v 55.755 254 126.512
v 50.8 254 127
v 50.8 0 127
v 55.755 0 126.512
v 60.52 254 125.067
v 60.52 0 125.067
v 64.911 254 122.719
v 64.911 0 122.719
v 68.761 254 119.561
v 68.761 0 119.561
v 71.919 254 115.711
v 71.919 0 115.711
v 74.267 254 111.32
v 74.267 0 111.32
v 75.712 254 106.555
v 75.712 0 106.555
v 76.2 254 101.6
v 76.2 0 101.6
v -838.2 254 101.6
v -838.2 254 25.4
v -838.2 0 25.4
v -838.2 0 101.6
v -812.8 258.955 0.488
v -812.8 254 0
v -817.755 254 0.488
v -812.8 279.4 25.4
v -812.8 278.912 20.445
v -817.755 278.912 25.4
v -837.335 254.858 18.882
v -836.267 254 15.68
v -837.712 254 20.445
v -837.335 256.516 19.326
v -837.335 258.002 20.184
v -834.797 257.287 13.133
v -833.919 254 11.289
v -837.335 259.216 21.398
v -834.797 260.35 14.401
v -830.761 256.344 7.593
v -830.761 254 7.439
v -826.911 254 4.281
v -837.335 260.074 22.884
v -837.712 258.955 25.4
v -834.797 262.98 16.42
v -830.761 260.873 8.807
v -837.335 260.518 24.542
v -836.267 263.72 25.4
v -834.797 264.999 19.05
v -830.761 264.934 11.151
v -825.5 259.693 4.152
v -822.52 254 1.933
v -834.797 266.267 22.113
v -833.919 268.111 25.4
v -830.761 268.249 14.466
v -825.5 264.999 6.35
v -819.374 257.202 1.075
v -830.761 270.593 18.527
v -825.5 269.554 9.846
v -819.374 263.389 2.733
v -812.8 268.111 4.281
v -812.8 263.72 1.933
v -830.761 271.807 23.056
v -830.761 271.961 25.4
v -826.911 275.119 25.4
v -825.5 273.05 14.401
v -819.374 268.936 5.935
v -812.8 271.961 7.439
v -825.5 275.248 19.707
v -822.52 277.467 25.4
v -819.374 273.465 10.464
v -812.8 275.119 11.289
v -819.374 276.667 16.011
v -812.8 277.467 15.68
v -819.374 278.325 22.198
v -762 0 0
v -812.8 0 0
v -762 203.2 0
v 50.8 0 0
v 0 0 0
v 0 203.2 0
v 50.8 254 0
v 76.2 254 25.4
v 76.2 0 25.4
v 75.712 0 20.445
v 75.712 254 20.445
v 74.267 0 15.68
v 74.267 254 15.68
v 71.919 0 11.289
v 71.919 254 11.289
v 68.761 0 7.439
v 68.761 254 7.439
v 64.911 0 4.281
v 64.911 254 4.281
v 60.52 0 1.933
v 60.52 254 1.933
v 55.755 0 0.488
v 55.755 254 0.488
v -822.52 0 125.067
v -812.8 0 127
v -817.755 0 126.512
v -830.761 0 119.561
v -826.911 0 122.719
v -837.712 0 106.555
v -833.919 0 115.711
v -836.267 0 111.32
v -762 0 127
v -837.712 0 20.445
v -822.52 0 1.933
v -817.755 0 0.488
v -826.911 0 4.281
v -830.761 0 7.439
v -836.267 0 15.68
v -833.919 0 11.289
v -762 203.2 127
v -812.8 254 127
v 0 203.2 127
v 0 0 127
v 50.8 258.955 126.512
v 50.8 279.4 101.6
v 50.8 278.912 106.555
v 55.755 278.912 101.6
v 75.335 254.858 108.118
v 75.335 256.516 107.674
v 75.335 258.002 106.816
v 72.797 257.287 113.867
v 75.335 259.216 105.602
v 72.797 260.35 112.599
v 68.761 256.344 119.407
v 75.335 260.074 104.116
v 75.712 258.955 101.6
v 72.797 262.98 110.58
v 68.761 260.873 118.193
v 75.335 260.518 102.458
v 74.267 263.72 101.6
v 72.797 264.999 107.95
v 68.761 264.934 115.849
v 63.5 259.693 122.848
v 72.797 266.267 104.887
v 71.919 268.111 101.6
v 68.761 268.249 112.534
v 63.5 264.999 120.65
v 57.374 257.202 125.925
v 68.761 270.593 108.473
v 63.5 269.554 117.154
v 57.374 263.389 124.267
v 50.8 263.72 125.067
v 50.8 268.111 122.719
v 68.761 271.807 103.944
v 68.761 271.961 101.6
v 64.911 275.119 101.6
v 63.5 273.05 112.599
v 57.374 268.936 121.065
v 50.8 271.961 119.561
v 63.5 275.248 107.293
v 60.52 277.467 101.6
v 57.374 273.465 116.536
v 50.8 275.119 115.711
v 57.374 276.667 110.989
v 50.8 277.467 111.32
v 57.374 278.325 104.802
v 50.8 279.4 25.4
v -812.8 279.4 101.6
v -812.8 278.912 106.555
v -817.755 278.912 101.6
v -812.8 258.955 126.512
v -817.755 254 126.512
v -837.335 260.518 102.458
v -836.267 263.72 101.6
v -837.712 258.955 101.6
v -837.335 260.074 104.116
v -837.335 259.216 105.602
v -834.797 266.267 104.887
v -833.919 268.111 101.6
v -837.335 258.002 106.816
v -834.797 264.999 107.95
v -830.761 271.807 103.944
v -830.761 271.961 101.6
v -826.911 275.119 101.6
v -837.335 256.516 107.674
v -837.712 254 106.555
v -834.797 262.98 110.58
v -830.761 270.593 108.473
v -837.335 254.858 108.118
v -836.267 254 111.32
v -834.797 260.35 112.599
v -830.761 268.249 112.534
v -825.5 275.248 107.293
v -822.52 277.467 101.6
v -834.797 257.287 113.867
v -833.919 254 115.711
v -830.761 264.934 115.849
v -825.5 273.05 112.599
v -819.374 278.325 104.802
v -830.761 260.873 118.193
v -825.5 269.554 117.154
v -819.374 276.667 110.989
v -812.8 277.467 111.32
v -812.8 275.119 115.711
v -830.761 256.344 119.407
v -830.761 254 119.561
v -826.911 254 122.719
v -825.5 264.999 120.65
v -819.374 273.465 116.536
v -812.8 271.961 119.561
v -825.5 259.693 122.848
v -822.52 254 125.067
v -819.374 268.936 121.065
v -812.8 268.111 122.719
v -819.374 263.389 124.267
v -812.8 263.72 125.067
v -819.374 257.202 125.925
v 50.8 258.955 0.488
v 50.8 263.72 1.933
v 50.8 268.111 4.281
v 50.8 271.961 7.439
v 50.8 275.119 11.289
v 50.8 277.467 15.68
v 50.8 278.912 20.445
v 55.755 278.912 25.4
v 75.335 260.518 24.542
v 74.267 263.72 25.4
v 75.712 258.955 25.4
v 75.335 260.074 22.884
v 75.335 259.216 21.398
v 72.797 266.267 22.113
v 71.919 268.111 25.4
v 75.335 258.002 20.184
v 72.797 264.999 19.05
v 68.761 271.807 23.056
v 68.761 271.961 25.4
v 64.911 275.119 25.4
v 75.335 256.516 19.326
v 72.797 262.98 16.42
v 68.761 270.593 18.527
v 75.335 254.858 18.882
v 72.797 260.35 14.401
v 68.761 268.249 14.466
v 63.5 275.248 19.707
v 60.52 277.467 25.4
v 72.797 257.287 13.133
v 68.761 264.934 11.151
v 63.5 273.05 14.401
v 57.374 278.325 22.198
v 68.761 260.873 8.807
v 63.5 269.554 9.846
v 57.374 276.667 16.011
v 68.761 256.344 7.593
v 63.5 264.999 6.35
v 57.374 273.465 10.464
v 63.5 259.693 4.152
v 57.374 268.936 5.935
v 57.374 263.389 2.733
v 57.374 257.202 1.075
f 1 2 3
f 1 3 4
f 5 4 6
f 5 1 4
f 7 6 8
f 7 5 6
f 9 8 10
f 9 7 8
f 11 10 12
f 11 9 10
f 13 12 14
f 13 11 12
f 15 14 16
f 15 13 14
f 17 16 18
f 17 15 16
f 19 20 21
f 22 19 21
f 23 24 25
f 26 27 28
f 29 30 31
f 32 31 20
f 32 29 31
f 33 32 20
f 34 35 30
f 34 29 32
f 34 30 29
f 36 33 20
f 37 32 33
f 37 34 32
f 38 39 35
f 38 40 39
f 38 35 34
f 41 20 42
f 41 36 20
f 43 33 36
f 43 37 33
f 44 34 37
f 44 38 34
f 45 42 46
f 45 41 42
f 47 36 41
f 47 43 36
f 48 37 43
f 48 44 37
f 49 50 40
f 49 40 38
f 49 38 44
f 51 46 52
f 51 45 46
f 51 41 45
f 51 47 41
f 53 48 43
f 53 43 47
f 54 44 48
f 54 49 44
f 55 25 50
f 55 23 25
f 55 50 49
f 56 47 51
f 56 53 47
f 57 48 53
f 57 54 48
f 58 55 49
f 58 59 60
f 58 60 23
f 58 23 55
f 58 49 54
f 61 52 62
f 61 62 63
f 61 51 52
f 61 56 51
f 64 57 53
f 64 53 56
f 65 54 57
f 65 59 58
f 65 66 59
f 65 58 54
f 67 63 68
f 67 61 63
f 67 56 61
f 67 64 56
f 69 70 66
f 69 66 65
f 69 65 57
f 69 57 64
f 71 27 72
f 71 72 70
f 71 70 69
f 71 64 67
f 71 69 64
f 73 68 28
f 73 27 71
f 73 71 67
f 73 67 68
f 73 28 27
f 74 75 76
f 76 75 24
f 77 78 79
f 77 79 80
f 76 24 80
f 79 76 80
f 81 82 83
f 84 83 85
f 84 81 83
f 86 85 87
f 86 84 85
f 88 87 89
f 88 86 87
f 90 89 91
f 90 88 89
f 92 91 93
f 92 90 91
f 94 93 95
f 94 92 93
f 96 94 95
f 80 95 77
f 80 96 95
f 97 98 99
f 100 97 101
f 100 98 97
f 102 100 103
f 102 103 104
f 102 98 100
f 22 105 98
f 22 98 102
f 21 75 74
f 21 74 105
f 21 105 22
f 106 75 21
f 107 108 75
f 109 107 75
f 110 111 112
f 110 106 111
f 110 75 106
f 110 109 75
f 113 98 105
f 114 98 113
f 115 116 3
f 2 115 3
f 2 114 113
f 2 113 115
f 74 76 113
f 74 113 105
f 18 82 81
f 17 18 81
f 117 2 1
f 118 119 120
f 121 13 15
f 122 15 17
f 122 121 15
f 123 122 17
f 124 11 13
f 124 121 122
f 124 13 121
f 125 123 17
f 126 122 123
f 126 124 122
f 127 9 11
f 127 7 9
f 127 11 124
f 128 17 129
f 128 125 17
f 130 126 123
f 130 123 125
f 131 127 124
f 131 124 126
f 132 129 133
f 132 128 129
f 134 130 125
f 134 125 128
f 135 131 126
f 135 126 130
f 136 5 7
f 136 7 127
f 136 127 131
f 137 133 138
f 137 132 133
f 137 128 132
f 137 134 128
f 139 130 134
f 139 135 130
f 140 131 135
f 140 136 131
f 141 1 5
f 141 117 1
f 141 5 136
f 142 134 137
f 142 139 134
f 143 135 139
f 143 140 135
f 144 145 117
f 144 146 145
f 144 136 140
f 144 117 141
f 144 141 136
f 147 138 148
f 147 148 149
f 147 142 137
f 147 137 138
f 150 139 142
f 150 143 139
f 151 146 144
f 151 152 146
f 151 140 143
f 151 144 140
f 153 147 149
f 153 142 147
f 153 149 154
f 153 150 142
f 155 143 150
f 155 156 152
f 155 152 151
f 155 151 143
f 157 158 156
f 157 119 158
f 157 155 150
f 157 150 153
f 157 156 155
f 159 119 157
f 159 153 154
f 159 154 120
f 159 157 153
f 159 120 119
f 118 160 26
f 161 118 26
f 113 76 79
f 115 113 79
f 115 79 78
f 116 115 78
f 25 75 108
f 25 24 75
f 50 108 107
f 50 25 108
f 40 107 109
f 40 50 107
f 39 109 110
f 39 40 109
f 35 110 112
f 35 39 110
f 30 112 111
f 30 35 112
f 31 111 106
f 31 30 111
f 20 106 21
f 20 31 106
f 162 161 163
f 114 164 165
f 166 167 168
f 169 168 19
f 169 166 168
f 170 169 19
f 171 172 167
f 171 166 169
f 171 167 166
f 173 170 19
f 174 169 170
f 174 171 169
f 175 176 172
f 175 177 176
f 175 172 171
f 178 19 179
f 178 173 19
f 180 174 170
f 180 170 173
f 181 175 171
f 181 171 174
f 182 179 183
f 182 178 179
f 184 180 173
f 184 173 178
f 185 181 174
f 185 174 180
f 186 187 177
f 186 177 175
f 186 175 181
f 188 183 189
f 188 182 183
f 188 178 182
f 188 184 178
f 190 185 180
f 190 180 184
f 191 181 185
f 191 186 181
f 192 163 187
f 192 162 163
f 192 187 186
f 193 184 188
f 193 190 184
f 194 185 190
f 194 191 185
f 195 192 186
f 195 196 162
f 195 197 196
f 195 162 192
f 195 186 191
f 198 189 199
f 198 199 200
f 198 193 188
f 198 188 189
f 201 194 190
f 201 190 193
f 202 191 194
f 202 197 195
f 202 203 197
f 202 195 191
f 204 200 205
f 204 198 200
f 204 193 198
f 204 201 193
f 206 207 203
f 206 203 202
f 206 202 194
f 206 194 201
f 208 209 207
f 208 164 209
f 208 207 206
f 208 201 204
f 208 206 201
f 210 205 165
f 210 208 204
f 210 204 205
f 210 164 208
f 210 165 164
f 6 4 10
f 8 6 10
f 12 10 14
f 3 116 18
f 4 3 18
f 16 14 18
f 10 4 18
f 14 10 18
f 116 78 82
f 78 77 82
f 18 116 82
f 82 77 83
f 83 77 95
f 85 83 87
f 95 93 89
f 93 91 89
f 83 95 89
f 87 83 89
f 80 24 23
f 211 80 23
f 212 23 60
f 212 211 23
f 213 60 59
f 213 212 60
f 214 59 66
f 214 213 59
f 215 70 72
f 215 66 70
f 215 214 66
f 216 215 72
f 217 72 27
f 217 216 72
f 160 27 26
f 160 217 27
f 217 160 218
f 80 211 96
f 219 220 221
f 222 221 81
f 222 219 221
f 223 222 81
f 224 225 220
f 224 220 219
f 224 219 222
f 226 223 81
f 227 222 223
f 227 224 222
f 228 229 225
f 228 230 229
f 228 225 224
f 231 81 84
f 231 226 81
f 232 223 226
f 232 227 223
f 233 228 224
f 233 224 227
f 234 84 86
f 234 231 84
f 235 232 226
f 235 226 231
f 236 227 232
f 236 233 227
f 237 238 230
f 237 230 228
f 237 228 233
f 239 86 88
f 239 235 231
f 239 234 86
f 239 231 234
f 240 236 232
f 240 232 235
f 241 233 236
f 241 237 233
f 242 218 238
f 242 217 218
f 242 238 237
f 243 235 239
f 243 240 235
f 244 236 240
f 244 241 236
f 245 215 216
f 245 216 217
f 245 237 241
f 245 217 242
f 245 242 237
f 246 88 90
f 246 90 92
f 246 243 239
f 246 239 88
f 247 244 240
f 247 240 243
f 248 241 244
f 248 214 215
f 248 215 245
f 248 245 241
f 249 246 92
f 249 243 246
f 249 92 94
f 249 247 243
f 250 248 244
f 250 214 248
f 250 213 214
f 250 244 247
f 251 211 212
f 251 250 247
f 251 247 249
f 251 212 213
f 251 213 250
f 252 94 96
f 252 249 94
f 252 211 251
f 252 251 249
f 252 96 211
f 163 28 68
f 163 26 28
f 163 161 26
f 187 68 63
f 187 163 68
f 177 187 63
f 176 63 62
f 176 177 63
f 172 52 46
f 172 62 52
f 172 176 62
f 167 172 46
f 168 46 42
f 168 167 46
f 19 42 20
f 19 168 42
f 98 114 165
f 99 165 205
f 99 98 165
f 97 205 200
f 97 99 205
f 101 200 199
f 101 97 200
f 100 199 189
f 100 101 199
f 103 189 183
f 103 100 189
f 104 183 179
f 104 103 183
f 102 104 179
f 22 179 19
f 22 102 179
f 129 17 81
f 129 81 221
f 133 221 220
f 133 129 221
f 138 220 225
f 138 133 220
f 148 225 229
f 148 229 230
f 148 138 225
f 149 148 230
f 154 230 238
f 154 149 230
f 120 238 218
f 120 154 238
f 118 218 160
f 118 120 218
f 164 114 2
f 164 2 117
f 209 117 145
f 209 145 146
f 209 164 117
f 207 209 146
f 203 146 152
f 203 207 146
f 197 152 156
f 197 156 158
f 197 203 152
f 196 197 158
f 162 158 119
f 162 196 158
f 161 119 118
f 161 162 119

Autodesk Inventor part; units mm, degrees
ref_plane "YZ Plane" through (0, 0, 0) normal (1, 0, 0) x (0, 1, 0)
ref_plane "XZ Plane" through (0, 0, 0) normal (0, 1, 0) x (-1, 0, 0)
ref_plane "XY Plane" through (0, 0, 0) normal (0, 0, 1) x (1, 0, 0)
sketch "Sketch1" plane through (0, 0, 0) normal (0, 0, 1) x (1, 0, 0)
  line L0 (0, 0) -> (76.2, 0)
  line L1 (76.2, 0) -> (76.2, 279.4)
  line L2 (76.2, 279.4) -> (0, 279.4)
  line L3 (0, 279.4) -> (0, 0)
  line L4 (0, 279.4) -> (-838.2, 279.4)
  line L5 (-838.2, 279.4) -> (-838.2, 203.2)
  line L6 (-838.2, 203.2) -> (0, 203.2)
  line L7 (0, 203.2) -> (0, 279.4)
  line L8 (-838.2, 203.2) -> (-762, 203.2)
  line L9 (-762, 203.2) -> (-762, 0)
  line L10 (-762, 0) -> (-838.2, 0)
  line L11 (-838.2, 0) -> (-838.2, 203.2)
  dimension "d0" = 76.2
  dimension "d1" = 279.4
  dimension "d2" = 838.2
  dimension "d3" = 76.2
  dimension "d4" = 76.2
  dimension "d5" = 203.2
extrude "Extrusion1" add sketch "Sketch1" along normal blind 127
sketch "Sketch2" plane through (-838.2, 279.4, 0) normal (0, 1, 0) x (1, 0, 0)
  line L0 (642.6606, -111.4085) -> (325.9156, -111.4085) construction
  line L1 (325.9156, -111.4085) -> (325.9156, -9.0111) construction
  line L2 (325.9156, -9.0111) -> (642.6606, -9.0111) construction
  line L3 (642.6606, -9.0111) -> (642.6606, -111.4085) construction
  point P0 (838.2, 0)
fillet "Fillet1" radius 25.4 8 edges at (-381, 279.4, 127) (-381, 279.4, 0) (76.2, 139.7, 127) (76.2, 139.7, 0) (76.2, 279.4, 63.5) (-838.2, 279.4, 63.5) (-838.2, 139.7, 127) (-838.2, 139.7, 0)
properties part number "bumper" material "Canvas, Blue Stripe"
